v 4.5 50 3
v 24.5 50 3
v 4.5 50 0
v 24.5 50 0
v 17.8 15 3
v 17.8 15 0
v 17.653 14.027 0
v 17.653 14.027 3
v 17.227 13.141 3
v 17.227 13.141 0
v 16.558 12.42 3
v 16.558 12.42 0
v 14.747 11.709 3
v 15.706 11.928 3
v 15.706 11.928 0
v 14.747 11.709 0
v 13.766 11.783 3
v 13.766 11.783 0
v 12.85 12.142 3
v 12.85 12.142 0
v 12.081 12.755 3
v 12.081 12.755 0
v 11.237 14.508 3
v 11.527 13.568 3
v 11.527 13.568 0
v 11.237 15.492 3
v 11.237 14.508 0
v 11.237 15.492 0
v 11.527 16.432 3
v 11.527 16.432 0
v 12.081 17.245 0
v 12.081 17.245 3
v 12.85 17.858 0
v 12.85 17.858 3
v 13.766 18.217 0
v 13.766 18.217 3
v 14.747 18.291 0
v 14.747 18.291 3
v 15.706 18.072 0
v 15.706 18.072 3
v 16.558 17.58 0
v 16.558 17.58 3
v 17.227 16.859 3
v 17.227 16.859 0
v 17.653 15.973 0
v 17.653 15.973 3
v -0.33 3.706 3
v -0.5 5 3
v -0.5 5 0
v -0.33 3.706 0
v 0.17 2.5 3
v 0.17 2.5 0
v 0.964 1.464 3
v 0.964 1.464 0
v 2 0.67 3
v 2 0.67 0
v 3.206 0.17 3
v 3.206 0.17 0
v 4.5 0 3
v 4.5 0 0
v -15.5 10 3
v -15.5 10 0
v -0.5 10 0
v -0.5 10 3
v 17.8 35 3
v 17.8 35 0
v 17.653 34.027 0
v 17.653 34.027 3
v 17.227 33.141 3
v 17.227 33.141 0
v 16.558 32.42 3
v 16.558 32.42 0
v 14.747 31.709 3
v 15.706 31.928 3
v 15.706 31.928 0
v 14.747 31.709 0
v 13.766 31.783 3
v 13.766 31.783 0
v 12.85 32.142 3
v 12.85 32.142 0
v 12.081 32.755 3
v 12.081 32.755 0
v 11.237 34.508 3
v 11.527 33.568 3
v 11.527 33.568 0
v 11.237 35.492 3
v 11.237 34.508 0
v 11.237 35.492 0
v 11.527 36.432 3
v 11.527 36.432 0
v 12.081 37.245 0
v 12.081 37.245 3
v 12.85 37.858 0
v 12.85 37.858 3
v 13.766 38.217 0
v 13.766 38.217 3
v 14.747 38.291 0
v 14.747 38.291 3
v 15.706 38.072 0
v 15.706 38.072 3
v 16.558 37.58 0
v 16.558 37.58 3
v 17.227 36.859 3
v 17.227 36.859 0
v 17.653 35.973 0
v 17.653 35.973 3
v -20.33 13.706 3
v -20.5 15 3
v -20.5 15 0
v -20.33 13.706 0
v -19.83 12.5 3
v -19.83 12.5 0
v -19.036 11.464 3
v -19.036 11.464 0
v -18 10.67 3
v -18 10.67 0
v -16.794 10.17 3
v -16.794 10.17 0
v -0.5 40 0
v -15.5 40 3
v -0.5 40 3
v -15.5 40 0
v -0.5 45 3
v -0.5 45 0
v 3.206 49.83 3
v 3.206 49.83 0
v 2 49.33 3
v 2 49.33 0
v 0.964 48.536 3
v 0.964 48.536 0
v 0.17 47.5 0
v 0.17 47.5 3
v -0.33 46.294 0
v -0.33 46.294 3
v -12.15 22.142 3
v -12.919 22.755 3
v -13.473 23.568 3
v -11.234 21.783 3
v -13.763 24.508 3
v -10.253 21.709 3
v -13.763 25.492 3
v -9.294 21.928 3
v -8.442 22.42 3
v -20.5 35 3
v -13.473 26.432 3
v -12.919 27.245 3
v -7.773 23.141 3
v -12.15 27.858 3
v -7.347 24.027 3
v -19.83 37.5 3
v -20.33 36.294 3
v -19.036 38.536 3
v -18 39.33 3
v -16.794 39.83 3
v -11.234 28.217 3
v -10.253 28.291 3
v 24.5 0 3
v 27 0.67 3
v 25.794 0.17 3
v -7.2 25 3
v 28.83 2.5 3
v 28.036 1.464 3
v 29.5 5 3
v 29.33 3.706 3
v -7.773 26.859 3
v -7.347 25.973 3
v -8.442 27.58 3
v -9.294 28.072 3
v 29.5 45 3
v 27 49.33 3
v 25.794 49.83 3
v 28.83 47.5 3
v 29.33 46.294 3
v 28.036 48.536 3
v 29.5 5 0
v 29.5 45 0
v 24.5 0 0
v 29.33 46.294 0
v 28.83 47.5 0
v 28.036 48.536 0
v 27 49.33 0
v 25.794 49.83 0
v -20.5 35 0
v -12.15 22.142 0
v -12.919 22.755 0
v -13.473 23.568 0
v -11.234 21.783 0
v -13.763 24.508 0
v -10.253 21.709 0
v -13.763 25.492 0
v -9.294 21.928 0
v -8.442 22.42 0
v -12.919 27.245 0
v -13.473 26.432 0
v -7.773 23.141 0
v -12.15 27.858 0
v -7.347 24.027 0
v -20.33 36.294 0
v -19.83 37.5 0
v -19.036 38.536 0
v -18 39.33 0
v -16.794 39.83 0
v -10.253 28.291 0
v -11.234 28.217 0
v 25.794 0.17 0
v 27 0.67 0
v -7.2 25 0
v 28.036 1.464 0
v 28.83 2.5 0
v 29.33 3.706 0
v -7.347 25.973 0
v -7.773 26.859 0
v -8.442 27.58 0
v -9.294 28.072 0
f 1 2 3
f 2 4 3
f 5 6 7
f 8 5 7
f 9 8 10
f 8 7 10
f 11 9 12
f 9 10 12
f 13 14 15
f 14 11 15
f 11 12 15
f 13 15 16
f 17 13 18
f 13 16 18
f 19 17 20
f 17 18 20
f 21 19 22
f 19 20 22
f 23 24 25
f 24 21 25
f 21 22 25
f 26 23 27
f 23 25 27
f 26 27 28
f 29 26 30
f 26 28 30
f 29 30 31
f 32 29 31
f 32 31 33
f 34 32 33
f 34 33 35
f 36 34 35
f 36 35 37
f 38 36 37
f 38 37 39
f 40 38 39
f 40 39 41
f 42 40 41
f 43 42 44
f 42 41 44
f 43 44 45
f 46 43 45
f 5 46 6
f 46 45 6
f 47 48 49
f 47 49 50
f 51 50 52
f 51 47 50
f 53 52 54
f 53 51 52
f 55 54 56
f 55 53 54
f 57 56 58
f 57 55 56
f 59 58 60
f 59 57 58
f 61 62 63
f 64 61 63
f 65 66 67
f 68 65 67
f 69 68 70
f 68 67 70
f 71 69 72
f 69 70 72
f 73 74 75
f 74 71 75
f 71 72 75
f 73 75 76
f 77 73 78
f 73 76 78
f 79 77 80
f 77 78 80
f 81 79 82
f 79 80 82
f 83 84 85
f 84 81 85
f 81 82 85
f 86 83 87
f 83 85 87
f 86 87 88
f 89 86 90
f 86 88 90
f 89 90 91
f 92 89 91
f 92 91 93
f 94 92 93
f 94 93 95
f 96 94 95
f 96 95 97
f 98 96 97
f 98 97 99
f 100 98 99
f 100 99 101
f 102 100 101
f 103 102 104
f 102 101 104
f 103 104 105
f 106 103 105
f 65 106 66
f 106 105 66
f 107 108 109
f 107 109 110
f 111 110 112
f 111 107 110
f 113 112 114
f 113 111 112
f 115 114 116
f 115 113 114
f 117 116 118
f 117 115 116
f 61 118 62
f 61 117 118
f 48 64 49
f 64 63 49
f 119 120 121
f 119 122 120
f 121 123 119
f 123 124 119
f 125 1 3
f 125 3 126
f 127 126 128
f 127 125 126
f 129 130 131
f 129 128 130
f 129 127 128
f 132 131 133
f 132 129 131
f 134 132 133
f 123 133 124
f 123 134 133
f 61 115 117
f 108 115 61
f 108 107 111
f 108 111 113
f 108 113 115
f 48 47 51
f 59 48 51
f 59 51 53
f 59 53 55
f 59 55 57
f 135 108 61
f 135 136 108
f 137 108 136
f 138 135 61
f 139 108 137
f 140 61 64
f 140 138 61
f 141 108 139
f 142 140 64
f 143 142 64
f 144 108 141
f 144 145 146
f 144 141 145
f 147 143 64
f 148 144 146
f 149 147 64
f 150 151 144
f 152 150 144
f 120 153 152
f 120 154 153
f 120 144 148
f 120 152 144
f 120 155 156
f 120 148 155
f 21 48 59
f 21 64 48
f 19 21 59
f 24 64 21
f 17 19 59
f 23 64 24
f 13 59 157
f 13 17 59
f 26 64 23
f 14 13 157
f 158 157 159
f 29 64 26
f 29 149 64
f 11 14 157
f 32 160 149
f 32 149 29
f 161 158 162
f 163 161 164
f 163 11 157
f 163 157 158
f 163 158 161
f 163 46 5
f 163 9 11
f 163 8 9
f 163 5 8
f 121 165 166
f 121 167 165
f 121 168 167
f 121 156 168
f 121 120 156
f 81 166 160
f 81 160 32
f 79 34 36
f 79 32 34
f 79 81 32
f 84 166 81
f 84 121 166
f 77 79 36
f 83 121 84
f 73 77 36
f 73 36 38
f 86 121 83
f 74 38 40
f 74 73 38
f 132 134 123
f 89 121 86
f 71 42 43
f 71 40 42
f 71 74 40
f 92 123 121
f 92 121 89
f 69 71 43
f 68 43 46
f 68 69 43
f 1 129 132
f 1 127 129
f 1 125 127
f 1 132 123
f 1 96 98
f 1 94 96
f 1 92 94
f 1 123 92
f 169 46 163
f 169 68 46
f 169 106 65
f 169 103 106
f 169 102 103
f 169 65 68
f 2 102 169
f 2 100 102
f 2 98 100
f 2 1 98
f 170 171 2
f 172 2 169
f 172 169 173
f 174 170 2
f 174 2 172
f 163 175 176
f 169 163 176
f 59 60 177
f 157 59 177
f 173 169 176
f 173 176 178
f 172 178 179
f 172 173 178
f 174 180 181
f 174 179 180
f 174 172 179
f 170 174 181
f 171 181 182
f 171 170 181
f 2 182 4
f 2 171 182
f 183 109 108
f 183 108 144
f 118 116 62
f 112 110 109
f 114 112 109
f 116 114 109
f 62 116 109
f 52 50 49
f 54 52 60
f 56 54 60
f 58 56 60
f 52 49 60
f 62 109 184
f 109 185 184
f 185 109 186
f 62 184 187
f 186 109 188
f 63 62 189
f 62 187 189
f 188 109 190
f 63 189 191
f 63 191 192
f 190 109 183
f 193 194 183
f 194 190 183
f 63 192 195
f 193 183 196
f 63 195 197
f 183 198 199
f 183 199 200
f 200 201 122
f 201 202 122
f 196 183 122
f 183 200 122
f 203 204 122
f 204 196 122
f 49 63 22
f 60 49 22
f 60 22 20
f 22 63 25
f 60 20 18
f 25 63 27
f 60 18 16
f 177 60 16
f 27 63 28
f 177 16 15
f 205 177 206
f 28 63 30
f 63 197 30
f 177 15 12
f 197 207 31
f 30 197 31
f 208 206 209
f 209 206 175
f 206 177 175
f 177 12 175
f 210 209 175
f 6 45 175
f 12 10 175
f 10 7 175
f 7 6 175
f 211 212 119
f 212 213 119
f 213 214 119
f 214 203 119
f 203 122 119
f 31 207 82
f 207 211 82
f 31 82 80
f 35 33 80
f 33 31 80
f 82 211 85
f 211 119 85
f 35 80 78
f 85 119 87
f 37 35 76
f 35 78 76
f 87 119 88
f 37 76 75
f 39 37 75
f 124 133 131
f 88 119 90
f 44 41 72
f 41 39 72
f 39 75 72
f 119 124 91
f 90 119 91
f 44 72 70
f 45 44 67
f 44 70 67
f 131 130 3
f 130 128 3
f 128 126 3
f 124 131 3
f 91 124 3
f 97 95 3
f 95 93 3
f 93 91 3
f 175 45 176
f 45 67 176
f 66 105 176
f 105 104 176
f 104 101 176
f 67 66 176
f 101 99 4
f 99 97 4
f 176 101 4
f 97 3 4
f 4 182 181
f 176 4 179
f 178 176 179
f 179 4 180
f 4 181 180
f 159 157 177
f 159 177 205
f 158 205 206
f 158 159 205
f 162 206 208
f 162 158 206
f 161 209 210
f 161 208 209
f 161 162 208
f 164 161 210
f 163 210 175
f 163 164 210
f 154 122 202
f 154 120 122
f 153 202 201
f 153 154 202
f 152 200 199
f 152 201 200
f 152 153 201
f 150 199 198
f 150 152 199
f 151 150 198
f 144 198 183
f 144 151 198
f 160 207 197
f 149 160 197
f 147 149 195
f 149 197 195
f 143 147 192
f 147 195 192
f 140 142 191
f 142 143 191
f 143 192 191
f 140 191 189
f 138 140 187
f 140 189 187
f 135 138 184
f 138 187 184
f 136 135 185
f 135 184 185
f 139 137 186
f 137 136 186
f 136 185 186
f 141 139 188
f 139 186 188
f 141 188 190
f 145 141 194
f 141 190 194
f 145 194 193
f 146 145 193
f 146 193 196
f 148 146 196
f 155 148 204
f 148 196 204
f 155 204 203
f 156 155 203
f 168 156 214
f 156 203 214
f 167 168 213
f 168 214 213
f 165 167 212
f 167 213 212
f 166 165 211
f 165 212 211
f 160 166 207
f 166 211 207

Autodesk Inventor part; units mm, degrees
ref_plane "YZ Plane" through (0, 0, 0) normal (1, 0, 0) x (0, 1, 0)
ref_plane "XZ Plane" through (0, 0, 0) normal (0, 1, 0) x (-1, 0, 0)
ref_plane "作業平面1" through (0, 0, 0) normal (0, 0, 1) x (1, 0, 0)
sketch "スケッチ2" plane through (0, 0, 0) normal (0, 0, 1) x (1, 0, 0)
  line L0 (0, 0) -> (7.35, 0) construction
  line L1 (7.35, 0) -> (7.35, 50) construction
  line L2 (0, 50) -> (7.35, 50) construction
  line L3 (0, 0) -> (0, 50) construction
  line L4 (-0.5, 0) -> (-0.5, 50) construction
  line L5 (19.5, 0) -> (19.5, 50) construction
  line L6 (139.5, 0) -> (139.5, -3) construction
  line L7 (139.5, 0) -> (4.5, 0) construction
  line L8 (4.5, -3) -> (4.5, 0) construction
  line L9 (139.5, -3) -> (4.5, -3) construction
  line L10 (139.5, 53) -> (139.5, 50) construction
  line L11 (4.5, 53) -> (139.5, 53) construction
  line L12 (4.5, 50) -> (4.5, 53) construction
  line L13 (4.5, 50) -> (139.5, 50) construction
  line L14 (-0.632, 5) -> (-130.632, 5) construction
  line L15 (-0.632, 45) -> (-130.632, 45) construction
  line L16 (-20.5, 10) -> (-20.5, 40)
  line L17 (-20.5, 40) -> (-0.5, 40)
  line L18 (-0.5, 40) -> (-0.5, 5)
  circle A0 centre (14.5, 15) radius 3.3
  circle A1 centre (14.5, 35) radius 3.3
  circle A2 centre (-10.5, 25) radius 3.3
  circle A3 centre (-10.5, 25) radius 3.3
  line L19 (-20.5, 10) -> (-0.5, 10)
  line L20 (-0.5, 0) -> (29.5, 0)
  line L21 (29.5, 0) -> (29.5, 50)
  line L22 (29.5, 50) -> (-0.5, 50)
  line L23 (-0.5, 50) -> (-0.5, 0)
  point P0 (9.5, 35)
  point P1 (-0.5, 40)
  point P2 (-0.5, 5)
  dimension "d1" = 20
  dimension "d2" = 30
  dimension "d4" = 50
  dimension "d5" = 15
  dimension "d13" = 6.6
  dimension "d17" = 6.6
  dimension "d19" = 10
  dimension "d20" = 6.6
  dimension "d22" = 10
  dimension "d23" = 6.6
  dimension "d25" = 15
  dimension "d27" = 10
  dimension "d29" = 15
  dimension "d30" = 15
  dimension "d31" = 30
  dimension "d32" = 50
  dimension "d33" = 15
  dimension "d34" = 15
extrude "押し出し1" add sketch "スケッチ2" along normal blind 3
fillet "フィレット1" radius 5 6 edges at (-20.5, 10, 1.5) (-20.5, 40, 1.5) (-0.5, 0, 1.5) (29.5, 0, 1.5) (-0.5, 50, 1.5) (29.5, 50, 1.5)
equation "\"d22\" = d19"
equation "\"d23\" = d13"
equation "\"d27\" = -0.5 * d2 + 0.5 * d28"
equation "\"d29\" = 0.5 * d2"
equation "\"d30\" = d29"
equation "\"d33\" = 0.5 * d31"
equation "\"d34\" = d33"
equation "\"d28\" = 50"
properties part number "bogie_mount" material "アルミニウム 6061"
